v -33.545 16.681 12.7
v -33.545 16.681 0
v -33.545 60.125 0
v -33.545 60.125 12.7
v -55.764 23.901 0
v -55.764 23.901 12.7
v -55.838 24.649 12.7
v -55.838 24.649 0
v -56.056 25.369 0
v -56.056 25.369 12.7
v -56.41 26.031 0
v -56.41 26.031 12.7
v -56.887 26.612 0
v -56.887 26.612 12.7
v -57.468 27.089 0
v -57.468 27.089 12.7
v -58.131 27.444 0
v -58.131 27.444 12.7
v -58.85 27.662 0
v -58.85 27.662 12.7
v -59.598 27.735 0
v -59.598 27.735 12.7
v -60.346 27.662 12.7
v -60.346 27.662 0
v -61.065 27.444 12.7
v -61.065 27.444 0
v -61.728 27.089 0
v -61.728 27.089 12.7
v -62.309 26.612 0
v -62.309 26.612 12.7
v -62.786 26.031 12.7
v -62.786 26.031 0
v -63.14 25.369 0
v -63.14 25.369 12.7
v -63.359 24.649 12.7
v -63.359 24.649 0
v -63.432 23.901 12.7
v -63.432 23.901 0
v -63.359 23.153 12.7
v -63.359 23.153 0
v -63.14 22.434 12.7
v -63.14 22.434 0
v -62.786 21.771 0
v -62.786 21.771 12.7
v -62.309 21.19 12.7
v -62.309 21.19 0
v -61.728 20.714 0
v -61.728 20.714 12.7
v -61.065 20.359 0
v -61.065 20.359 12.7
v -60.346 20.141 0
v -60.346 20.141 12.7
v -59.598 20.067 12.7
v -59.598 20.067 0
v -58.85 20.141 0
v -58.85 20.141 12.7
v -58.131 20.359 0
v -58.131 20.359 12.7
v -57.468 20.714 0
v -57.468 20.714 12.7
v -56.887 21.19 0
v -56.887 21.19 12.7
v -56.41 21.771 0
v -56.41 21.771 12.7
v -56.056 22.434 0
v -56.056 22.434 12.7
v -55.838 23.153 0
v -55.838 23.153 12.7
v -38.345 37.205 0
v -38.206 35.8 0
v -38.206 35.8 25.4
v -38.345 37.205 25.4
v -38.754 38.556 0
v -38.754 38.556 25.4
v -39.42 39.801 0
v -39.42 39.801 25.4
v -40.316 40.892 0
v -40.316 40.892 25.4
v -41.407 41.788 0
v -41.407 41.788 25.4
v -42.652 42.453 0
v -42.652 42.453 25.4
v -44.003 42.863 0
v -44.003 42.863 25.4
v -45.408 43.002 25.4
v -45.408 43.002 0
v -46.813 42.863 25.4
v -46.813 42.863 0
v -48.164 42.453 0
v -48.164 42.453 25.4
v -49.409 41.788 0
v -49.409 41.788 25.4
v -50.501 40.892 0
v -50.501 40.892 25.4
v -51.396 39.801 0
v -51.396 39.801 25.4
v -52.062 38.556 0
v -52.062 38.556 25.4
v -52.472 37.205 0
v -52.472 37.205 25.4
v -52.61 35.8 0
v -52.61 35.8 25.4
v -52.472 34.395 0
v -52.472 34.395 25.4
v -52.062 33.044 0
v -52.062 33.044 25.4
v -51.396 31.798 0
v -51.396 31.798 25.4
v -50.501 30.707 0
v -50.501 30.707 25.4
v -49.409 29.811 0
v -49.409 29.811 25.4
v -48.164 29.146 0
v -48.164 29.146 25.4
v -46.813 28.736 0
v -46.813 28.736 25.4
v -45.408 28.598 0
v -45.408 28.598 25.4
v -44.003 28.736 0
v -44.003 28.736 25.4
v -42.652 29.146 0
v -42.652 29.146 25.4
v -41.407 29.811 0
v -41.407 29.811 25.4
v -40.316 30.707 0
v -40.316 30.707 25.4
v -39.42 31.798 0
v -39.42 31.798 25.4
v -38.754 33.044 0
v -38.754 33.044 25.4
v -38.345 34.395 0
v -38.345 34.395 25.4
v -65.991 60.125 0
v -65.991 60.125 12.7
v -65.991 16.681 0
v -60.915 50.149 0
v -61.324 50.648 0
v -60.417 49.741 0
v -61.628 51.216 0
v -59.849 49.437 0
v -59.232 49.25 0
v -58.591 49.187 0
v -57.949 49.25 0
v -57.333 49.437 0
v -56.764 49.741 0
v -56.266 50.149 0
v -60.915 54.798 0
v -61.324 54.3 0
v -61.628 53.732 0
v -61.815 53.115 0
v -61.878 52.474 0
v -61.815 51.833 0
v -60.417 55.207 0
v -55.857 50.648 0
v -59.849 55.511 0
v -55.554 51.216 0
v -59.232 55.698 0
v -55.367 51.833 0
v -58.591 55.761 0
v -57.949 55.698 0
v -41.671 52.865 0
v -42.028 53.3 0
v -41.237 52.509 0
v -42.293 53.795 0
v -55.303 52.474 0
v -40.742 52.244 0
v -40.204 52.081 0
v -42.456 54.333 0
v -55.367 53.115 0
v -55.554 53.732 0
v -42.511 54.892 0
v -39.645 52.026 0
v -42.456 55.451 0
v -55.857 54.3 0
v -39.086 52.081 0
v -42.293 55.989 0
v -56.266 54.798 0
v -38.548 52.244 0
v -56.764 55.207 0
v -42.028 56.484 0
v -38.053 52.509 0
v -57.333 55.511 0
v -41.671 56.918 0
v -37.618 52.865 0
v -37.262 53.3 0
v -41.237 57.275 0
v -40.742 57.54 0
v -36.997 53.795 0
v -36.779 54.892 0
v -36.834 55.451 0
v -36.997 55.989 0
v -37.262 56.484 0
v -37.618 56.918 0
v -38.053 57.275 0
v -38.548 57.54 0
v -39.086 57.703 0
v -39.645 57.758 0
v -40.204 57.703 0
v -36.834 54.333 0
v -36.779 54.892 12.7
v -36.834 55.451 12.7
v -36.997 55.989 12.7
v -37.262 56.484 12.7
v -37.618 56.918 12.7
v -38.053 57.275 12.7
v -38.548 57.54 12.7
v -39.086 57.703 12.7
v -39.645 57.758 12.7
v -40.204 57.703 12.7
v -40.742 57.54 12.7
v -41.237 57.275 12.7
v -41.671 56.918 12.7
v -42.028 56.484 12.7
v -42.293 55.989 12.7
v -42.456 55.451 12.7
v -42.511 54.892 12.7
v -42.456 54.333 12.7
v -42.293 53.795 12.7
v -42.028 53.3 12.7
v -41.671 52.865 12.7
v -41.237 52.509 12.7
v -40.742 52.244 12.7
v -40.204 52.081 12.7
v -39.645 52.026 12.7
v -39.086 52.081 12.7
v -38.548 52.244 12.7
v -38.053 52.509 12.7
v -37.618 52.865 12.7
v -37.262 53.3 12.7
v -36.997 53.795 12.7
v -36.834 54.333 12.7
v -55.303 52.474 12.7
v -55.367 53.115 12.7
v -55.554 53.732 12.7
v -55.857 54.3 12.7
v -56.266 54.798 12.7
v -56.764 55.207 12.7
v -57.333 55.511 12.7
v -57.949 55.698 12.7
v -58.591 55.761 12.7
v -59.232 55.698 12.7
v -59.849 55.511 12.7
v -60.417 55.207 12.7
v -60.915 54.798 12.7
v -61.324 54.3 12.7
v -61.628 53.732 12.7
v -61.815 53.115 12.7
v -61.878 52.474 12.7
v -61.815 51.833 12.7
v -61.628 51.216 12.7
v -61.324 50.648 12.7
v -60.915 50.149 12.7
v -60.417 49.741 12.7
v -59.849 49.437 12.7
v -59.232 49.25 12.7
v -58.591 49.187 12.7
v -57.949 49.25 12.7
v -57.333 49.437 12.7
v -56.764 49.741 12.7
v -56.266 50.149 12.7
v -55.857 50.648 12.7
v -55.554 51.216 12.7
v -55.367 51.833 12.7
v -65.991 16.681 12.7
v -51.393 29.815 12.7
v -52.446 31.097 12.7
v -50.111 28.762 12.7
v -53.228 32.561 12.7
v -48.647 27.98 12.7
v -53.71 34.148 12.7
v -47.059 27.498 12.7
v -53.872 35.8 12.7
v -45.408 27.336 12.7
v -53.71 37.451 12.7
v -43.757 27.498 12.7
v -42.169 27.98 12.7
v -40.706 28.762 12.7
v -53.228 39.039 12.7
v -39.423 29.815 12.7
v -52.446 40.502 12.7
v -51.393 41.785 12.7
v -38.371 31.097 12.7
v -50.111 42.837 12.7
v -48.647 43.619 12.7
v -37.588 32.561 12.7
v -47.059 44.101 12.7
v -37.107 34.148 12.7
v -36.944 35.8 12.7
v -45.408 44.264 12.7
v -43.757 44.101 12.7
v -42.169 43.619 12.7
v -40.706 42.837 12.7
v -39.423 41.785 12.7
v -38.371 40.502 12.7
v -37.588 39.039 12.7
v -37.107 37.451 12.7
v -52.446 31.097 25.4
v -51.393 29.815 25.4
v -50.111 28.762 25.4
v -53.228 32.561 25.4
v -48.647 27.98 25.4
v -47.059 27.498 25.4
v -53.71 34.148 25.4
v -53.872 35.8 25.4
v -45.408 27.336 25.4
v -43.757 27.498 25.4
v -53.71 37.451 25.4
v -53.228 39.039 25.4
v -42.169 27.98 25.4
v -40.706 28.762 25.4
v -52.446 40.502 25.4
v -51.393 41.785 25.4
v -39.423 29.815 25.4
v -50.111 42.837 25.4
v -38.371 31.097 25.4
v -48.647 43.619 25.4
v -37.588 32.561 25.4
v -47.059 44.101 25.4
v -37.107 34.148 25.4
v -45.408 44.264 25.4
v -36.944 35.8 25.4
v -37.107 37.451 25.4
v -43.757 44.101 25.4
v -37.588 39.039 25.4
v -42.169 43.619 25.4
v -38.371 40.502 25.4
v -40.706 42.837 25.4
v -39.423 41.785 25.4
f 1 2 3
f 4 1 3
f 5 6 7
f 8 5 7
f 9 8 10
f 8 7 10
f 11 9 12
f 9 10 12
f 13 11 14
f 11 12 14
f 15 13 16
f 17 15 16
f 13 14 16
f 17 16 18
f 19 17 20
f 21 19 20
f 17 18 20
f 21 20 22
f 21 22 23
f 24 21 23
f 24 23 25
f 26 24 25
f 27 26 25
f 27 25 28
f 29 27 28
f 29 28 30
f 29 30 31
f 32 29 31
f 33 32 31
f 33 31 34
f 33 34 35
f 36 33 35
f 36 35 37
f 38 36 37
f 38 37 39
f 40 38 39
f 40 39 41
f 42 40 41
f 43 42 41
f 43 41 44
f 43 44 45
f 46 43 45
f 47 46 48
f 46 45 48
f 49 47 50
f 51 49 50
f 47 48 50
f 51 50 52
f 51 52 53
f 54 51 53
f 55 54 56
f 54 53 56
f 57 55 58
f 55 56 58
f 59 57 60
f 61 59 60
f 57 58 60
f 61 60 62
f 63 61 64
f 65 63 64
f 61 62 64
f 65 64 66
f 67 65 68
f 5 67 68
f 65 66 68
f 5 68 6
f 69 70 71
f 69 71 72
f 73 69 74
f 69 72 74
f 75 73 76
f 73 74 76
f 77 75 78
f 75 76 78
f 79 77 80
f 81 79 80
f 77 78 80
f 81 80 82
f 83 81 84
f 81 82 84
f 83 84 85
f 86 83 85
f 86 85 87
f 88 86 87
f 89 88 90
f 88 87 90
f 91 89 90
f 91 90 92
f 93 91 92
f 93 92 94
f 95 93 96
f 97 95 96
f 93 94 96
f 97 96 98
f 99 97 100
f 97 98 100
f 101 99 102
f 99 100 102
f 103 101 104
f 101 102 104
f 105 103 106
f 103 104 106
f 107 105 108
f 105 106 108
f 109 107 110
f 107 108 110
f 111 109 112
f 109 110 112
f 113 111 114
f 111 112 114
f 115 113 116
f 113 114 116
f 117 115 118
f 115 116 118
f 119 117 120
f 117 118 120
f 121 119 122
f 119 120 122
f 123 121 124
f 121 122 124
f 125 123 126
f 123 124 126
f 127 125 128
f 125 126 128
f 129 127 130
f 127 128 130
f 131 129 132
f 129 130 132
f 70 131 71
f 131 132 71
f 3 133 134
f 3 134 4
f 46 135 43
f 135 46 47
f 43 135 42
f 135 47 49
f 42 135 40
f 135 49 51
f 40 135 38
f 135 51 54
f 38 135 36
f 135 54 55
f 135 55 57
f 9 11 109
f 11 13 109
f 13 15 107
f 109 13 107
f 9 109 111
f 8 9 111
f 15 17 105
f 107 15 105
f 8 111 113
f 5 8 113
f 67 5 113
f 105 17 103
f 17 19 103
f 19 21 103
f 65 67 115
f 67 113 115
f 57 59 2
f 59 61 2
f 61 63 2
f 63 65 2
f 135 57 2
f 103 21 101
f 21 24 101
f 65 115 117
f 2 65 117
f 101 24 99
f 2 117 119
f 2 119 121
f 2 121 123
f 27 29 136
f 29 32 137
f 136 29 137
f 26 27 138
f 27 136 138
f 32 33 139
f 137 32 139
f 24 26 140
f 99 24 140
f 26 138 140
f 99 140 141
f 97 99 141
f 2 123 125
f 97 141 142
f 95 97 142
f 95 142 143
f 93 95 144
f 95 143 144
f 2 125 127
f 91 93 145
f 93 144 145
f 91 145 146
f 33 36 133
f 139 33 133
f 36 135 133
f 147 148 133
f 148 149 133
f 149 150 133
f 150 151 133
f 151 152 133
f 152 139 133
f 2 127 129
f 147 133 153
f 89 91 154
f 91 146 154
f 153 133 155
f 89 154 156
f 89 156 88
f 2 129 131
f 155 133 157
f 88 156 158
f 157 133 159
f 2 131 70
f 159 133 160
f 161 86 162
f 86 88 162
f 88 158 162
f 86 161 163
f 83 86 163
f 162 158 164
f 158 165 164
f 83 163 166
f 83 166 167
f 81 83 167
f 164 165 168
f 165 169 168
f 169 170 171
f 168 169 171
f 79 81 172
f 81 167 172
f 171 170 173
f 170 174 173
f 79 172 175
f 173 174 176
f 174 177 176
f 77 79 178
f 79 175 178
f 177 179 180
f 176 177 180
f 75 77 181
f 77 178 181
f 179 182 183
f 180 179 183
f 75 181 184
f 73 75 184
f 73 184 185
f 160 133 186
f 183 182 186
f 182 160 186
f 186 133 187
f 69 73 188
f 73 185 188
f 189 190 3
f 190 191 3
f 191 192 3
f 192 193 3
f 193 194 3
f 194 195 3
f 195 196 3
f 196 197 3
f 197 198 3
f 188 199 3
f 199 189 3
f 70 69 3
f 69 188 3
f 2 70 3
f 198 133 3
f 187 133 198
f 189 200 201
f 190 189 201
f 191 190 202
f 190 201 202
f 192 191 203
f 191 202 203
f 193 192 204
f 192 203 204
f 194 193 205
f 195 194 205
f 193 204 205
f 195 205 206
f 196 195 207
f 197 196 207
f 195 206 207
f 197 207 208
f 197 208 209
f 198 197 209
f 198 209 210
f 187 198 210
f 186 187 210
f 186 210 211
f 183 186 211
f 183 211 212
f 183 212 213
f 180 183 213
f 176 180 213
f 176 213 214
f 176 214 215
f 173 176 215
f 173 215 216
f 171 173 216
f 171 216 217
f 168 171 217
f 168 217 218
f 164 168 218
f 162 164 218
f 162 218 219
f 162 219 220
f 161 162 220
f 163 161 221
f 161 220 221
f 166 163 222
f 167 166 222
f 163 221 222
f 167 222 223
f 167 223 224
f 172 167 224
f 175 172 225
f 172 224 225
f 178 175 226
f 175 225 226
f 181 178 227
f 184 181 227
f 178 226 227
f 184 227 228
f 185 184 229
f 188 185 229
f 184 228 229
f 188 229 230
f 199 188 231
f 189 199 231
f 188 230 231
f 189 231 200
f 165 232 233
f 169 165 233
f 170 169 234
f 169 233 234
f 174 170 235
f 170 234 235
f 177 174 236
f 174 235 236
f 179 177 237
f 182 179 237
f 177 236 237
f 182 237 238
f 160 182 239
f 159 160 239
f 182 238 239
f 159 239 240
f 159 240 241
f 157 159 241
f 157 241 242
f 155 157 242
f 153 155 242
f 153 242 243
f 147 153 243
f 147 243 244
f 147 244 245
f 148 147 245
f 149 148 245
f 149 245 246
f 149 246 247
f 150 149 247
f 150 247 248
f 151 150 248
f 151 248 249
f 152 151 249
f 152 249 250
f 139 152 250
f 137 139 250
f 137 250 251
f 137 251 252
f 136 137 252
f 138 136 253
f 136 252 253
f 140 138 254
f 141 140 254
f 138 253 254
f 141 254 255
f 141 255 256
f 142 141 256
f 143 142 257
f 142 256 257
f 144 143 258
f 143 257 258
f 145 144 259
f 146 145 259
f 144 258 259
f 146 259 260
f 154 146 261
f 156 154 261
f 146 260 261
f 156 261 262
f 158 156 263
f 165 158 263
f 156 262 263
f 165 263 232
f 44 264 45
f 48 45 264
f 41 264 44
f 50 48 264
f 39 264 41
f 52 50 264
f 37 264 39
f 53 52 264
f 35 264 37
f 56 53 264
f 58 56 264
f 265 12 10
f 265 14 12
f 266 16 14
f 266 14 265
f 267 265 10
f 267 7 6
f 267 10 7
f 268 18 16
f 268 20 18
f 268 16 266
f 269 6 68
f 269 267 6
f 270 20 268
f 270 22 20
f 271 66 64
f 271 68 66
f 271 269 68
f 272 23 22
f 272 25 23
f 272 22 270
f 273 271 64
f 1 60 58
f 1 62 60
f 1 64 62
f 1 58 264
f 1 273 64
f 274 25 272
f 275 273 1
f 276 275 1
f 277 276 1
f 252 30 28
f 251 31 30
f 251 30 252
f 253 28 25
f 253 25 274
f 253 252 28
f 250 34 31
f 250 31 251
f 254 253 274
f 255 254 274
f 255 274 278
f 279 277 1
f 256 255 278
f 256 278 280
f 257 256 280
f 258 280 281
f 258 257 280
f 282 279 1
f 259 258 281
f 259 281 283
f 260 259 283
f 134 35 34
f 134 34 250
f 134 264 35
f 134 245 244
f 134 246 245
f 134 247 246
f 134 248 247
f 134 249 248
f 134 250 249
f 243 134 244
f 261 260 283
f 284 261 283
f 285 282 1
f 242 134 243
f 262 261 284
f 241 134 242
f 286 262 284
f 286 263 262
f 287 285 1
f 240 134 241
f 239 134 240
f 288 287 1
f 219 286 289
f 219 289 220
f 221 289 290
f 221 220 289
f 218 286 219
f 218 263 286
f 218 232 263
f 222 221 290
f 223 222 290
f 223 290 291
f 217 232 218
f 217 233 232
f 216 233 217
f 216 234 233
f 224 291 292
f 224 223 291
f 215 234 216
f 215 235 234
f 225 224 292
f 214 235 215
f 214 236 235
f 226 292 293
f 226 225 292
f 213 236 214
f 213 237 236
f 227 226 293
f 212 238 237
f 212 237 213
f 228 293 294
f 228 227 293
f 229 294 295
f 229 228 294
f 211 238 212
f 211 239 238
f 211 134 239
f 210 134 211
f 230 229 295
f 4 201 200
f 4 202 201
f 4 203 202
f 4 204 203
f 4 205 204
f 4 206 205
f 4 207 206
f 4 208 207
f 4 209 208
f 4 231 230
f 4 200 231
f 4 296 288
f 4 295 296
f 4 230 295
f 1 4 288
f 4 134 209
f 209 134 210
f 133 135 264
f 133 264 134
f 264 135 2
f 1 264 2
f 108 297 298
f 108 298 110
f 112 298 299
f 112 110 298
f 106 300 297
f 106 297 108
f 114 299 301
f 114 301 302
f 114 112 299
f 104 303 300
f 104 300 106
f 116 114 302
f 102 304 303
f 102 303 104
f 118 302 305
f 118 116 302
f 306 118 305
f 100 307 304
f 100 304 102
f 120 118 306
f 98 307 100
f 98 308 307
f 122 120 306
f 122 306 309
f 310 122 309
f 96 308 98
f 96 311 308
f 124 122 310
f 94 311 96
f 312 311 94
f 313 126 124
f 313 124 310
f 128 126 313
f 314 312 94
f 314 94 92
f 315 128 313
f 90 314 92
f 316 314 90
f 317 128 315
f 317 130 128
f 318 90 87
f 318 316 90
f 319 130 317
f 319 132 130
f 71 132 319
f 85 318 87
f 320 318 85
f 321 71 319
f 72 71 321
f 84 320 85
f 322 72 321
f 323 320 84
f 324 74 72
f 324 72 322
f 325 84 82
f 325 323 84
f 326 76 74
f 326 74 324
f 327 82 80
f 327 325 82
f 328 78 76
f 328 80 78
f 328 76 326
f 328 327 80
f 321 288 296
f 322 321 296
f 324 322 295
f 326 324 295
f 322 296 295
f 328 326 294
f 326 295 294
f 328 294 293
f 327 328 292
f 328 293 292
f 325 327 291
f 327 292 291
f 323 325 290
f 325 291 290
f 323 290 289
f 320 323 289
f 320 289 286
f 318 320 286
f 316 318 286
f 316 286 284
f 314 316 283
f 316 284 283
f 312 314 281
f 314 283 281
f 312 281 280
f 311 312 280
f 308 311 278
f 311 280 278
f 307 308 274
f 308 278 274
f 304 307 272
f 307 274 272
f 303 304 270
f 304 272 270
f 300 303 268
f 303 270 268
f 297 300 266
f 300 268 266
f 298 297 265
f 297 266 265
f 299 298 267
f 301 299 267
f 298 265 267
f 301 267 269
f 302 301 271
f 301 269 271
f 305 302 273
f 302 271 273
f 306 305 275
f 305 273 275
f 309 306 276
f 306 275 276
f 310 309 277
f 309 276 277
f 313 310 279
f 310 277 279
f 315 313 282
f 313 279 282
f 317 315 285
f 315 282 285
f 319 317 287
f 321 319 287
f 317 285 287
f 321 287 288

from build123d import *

# Parameters (mm, degrees)
F0_W      = 32.445639
F0_H      = 43.444172
F1_DEPTH  = 12.7
F2_R      = 8.464038
F3_DEPTH  = 12.7
F4_R      = 7.201961
F5_DEPTH  = 25.4
F8_R      = 3.287286
F9_DEPTH  = 25.4
F10_R     = 2.865858
F11_DEPTH = 25.4
F12_R     = 3.833987
F13_DEPTH = 25.4


with BuildPart() as f1:
    # F0 (on Top) → F1 (new body)
    with BuildSketch(Plane.XY):
        with Locations((-49.768306, 38.403161)):
            Rectangle(F0_W, F0_H)
    extrude(amount=F1_DEPTH)

    # F2 (on face) → F3 (join)
    with BuildSketch(Plane.XY.offset(12.7)):
        with Locations((-45.408141, 35.799652)):
            Circle(F2_R)
    extrude(amount=F3_DEPTH)

    # F4 (on face) → F5 (cut)
    with BuildSketch(Plane.XY.offset(25.4)):
        with Locations((-45.408141, 35.799652)):
            Circle(F4_R)
    extrude(amount=-F5_DEPTH, mode=Mode.SUBTRACT)

    # F8 (on face) → F9 (cut)
    with BuildSketch(Plane.XY.offset(12.7)):
        with Locations((-58.590725, 52.473925)):
            Circle(F8_R)
    extrude(amount=-F9_DEPTH, mode=Mode.SUBTRACT)

    # F10 (on face) → F11 (cut)
    with BuildSketch(Plane.XY.offset(12.7)):
        with Locations((-39.644916, 54.891884)):
            Circle(F10_R)
    extrude(amount=-F11_DEPTH, mode=Mode.SUBTRACT)

    # F12 (on face) → F13 (cut)
    with BuildSketch(Plane.XY.offset(12.7)):
        with Locations((-59.598204, 23.901373)):
            Circle(F12_R)
    extrude(amount=-F13_DEPTH, mode=Mode.SUBTRACT)


solid = f1.part
